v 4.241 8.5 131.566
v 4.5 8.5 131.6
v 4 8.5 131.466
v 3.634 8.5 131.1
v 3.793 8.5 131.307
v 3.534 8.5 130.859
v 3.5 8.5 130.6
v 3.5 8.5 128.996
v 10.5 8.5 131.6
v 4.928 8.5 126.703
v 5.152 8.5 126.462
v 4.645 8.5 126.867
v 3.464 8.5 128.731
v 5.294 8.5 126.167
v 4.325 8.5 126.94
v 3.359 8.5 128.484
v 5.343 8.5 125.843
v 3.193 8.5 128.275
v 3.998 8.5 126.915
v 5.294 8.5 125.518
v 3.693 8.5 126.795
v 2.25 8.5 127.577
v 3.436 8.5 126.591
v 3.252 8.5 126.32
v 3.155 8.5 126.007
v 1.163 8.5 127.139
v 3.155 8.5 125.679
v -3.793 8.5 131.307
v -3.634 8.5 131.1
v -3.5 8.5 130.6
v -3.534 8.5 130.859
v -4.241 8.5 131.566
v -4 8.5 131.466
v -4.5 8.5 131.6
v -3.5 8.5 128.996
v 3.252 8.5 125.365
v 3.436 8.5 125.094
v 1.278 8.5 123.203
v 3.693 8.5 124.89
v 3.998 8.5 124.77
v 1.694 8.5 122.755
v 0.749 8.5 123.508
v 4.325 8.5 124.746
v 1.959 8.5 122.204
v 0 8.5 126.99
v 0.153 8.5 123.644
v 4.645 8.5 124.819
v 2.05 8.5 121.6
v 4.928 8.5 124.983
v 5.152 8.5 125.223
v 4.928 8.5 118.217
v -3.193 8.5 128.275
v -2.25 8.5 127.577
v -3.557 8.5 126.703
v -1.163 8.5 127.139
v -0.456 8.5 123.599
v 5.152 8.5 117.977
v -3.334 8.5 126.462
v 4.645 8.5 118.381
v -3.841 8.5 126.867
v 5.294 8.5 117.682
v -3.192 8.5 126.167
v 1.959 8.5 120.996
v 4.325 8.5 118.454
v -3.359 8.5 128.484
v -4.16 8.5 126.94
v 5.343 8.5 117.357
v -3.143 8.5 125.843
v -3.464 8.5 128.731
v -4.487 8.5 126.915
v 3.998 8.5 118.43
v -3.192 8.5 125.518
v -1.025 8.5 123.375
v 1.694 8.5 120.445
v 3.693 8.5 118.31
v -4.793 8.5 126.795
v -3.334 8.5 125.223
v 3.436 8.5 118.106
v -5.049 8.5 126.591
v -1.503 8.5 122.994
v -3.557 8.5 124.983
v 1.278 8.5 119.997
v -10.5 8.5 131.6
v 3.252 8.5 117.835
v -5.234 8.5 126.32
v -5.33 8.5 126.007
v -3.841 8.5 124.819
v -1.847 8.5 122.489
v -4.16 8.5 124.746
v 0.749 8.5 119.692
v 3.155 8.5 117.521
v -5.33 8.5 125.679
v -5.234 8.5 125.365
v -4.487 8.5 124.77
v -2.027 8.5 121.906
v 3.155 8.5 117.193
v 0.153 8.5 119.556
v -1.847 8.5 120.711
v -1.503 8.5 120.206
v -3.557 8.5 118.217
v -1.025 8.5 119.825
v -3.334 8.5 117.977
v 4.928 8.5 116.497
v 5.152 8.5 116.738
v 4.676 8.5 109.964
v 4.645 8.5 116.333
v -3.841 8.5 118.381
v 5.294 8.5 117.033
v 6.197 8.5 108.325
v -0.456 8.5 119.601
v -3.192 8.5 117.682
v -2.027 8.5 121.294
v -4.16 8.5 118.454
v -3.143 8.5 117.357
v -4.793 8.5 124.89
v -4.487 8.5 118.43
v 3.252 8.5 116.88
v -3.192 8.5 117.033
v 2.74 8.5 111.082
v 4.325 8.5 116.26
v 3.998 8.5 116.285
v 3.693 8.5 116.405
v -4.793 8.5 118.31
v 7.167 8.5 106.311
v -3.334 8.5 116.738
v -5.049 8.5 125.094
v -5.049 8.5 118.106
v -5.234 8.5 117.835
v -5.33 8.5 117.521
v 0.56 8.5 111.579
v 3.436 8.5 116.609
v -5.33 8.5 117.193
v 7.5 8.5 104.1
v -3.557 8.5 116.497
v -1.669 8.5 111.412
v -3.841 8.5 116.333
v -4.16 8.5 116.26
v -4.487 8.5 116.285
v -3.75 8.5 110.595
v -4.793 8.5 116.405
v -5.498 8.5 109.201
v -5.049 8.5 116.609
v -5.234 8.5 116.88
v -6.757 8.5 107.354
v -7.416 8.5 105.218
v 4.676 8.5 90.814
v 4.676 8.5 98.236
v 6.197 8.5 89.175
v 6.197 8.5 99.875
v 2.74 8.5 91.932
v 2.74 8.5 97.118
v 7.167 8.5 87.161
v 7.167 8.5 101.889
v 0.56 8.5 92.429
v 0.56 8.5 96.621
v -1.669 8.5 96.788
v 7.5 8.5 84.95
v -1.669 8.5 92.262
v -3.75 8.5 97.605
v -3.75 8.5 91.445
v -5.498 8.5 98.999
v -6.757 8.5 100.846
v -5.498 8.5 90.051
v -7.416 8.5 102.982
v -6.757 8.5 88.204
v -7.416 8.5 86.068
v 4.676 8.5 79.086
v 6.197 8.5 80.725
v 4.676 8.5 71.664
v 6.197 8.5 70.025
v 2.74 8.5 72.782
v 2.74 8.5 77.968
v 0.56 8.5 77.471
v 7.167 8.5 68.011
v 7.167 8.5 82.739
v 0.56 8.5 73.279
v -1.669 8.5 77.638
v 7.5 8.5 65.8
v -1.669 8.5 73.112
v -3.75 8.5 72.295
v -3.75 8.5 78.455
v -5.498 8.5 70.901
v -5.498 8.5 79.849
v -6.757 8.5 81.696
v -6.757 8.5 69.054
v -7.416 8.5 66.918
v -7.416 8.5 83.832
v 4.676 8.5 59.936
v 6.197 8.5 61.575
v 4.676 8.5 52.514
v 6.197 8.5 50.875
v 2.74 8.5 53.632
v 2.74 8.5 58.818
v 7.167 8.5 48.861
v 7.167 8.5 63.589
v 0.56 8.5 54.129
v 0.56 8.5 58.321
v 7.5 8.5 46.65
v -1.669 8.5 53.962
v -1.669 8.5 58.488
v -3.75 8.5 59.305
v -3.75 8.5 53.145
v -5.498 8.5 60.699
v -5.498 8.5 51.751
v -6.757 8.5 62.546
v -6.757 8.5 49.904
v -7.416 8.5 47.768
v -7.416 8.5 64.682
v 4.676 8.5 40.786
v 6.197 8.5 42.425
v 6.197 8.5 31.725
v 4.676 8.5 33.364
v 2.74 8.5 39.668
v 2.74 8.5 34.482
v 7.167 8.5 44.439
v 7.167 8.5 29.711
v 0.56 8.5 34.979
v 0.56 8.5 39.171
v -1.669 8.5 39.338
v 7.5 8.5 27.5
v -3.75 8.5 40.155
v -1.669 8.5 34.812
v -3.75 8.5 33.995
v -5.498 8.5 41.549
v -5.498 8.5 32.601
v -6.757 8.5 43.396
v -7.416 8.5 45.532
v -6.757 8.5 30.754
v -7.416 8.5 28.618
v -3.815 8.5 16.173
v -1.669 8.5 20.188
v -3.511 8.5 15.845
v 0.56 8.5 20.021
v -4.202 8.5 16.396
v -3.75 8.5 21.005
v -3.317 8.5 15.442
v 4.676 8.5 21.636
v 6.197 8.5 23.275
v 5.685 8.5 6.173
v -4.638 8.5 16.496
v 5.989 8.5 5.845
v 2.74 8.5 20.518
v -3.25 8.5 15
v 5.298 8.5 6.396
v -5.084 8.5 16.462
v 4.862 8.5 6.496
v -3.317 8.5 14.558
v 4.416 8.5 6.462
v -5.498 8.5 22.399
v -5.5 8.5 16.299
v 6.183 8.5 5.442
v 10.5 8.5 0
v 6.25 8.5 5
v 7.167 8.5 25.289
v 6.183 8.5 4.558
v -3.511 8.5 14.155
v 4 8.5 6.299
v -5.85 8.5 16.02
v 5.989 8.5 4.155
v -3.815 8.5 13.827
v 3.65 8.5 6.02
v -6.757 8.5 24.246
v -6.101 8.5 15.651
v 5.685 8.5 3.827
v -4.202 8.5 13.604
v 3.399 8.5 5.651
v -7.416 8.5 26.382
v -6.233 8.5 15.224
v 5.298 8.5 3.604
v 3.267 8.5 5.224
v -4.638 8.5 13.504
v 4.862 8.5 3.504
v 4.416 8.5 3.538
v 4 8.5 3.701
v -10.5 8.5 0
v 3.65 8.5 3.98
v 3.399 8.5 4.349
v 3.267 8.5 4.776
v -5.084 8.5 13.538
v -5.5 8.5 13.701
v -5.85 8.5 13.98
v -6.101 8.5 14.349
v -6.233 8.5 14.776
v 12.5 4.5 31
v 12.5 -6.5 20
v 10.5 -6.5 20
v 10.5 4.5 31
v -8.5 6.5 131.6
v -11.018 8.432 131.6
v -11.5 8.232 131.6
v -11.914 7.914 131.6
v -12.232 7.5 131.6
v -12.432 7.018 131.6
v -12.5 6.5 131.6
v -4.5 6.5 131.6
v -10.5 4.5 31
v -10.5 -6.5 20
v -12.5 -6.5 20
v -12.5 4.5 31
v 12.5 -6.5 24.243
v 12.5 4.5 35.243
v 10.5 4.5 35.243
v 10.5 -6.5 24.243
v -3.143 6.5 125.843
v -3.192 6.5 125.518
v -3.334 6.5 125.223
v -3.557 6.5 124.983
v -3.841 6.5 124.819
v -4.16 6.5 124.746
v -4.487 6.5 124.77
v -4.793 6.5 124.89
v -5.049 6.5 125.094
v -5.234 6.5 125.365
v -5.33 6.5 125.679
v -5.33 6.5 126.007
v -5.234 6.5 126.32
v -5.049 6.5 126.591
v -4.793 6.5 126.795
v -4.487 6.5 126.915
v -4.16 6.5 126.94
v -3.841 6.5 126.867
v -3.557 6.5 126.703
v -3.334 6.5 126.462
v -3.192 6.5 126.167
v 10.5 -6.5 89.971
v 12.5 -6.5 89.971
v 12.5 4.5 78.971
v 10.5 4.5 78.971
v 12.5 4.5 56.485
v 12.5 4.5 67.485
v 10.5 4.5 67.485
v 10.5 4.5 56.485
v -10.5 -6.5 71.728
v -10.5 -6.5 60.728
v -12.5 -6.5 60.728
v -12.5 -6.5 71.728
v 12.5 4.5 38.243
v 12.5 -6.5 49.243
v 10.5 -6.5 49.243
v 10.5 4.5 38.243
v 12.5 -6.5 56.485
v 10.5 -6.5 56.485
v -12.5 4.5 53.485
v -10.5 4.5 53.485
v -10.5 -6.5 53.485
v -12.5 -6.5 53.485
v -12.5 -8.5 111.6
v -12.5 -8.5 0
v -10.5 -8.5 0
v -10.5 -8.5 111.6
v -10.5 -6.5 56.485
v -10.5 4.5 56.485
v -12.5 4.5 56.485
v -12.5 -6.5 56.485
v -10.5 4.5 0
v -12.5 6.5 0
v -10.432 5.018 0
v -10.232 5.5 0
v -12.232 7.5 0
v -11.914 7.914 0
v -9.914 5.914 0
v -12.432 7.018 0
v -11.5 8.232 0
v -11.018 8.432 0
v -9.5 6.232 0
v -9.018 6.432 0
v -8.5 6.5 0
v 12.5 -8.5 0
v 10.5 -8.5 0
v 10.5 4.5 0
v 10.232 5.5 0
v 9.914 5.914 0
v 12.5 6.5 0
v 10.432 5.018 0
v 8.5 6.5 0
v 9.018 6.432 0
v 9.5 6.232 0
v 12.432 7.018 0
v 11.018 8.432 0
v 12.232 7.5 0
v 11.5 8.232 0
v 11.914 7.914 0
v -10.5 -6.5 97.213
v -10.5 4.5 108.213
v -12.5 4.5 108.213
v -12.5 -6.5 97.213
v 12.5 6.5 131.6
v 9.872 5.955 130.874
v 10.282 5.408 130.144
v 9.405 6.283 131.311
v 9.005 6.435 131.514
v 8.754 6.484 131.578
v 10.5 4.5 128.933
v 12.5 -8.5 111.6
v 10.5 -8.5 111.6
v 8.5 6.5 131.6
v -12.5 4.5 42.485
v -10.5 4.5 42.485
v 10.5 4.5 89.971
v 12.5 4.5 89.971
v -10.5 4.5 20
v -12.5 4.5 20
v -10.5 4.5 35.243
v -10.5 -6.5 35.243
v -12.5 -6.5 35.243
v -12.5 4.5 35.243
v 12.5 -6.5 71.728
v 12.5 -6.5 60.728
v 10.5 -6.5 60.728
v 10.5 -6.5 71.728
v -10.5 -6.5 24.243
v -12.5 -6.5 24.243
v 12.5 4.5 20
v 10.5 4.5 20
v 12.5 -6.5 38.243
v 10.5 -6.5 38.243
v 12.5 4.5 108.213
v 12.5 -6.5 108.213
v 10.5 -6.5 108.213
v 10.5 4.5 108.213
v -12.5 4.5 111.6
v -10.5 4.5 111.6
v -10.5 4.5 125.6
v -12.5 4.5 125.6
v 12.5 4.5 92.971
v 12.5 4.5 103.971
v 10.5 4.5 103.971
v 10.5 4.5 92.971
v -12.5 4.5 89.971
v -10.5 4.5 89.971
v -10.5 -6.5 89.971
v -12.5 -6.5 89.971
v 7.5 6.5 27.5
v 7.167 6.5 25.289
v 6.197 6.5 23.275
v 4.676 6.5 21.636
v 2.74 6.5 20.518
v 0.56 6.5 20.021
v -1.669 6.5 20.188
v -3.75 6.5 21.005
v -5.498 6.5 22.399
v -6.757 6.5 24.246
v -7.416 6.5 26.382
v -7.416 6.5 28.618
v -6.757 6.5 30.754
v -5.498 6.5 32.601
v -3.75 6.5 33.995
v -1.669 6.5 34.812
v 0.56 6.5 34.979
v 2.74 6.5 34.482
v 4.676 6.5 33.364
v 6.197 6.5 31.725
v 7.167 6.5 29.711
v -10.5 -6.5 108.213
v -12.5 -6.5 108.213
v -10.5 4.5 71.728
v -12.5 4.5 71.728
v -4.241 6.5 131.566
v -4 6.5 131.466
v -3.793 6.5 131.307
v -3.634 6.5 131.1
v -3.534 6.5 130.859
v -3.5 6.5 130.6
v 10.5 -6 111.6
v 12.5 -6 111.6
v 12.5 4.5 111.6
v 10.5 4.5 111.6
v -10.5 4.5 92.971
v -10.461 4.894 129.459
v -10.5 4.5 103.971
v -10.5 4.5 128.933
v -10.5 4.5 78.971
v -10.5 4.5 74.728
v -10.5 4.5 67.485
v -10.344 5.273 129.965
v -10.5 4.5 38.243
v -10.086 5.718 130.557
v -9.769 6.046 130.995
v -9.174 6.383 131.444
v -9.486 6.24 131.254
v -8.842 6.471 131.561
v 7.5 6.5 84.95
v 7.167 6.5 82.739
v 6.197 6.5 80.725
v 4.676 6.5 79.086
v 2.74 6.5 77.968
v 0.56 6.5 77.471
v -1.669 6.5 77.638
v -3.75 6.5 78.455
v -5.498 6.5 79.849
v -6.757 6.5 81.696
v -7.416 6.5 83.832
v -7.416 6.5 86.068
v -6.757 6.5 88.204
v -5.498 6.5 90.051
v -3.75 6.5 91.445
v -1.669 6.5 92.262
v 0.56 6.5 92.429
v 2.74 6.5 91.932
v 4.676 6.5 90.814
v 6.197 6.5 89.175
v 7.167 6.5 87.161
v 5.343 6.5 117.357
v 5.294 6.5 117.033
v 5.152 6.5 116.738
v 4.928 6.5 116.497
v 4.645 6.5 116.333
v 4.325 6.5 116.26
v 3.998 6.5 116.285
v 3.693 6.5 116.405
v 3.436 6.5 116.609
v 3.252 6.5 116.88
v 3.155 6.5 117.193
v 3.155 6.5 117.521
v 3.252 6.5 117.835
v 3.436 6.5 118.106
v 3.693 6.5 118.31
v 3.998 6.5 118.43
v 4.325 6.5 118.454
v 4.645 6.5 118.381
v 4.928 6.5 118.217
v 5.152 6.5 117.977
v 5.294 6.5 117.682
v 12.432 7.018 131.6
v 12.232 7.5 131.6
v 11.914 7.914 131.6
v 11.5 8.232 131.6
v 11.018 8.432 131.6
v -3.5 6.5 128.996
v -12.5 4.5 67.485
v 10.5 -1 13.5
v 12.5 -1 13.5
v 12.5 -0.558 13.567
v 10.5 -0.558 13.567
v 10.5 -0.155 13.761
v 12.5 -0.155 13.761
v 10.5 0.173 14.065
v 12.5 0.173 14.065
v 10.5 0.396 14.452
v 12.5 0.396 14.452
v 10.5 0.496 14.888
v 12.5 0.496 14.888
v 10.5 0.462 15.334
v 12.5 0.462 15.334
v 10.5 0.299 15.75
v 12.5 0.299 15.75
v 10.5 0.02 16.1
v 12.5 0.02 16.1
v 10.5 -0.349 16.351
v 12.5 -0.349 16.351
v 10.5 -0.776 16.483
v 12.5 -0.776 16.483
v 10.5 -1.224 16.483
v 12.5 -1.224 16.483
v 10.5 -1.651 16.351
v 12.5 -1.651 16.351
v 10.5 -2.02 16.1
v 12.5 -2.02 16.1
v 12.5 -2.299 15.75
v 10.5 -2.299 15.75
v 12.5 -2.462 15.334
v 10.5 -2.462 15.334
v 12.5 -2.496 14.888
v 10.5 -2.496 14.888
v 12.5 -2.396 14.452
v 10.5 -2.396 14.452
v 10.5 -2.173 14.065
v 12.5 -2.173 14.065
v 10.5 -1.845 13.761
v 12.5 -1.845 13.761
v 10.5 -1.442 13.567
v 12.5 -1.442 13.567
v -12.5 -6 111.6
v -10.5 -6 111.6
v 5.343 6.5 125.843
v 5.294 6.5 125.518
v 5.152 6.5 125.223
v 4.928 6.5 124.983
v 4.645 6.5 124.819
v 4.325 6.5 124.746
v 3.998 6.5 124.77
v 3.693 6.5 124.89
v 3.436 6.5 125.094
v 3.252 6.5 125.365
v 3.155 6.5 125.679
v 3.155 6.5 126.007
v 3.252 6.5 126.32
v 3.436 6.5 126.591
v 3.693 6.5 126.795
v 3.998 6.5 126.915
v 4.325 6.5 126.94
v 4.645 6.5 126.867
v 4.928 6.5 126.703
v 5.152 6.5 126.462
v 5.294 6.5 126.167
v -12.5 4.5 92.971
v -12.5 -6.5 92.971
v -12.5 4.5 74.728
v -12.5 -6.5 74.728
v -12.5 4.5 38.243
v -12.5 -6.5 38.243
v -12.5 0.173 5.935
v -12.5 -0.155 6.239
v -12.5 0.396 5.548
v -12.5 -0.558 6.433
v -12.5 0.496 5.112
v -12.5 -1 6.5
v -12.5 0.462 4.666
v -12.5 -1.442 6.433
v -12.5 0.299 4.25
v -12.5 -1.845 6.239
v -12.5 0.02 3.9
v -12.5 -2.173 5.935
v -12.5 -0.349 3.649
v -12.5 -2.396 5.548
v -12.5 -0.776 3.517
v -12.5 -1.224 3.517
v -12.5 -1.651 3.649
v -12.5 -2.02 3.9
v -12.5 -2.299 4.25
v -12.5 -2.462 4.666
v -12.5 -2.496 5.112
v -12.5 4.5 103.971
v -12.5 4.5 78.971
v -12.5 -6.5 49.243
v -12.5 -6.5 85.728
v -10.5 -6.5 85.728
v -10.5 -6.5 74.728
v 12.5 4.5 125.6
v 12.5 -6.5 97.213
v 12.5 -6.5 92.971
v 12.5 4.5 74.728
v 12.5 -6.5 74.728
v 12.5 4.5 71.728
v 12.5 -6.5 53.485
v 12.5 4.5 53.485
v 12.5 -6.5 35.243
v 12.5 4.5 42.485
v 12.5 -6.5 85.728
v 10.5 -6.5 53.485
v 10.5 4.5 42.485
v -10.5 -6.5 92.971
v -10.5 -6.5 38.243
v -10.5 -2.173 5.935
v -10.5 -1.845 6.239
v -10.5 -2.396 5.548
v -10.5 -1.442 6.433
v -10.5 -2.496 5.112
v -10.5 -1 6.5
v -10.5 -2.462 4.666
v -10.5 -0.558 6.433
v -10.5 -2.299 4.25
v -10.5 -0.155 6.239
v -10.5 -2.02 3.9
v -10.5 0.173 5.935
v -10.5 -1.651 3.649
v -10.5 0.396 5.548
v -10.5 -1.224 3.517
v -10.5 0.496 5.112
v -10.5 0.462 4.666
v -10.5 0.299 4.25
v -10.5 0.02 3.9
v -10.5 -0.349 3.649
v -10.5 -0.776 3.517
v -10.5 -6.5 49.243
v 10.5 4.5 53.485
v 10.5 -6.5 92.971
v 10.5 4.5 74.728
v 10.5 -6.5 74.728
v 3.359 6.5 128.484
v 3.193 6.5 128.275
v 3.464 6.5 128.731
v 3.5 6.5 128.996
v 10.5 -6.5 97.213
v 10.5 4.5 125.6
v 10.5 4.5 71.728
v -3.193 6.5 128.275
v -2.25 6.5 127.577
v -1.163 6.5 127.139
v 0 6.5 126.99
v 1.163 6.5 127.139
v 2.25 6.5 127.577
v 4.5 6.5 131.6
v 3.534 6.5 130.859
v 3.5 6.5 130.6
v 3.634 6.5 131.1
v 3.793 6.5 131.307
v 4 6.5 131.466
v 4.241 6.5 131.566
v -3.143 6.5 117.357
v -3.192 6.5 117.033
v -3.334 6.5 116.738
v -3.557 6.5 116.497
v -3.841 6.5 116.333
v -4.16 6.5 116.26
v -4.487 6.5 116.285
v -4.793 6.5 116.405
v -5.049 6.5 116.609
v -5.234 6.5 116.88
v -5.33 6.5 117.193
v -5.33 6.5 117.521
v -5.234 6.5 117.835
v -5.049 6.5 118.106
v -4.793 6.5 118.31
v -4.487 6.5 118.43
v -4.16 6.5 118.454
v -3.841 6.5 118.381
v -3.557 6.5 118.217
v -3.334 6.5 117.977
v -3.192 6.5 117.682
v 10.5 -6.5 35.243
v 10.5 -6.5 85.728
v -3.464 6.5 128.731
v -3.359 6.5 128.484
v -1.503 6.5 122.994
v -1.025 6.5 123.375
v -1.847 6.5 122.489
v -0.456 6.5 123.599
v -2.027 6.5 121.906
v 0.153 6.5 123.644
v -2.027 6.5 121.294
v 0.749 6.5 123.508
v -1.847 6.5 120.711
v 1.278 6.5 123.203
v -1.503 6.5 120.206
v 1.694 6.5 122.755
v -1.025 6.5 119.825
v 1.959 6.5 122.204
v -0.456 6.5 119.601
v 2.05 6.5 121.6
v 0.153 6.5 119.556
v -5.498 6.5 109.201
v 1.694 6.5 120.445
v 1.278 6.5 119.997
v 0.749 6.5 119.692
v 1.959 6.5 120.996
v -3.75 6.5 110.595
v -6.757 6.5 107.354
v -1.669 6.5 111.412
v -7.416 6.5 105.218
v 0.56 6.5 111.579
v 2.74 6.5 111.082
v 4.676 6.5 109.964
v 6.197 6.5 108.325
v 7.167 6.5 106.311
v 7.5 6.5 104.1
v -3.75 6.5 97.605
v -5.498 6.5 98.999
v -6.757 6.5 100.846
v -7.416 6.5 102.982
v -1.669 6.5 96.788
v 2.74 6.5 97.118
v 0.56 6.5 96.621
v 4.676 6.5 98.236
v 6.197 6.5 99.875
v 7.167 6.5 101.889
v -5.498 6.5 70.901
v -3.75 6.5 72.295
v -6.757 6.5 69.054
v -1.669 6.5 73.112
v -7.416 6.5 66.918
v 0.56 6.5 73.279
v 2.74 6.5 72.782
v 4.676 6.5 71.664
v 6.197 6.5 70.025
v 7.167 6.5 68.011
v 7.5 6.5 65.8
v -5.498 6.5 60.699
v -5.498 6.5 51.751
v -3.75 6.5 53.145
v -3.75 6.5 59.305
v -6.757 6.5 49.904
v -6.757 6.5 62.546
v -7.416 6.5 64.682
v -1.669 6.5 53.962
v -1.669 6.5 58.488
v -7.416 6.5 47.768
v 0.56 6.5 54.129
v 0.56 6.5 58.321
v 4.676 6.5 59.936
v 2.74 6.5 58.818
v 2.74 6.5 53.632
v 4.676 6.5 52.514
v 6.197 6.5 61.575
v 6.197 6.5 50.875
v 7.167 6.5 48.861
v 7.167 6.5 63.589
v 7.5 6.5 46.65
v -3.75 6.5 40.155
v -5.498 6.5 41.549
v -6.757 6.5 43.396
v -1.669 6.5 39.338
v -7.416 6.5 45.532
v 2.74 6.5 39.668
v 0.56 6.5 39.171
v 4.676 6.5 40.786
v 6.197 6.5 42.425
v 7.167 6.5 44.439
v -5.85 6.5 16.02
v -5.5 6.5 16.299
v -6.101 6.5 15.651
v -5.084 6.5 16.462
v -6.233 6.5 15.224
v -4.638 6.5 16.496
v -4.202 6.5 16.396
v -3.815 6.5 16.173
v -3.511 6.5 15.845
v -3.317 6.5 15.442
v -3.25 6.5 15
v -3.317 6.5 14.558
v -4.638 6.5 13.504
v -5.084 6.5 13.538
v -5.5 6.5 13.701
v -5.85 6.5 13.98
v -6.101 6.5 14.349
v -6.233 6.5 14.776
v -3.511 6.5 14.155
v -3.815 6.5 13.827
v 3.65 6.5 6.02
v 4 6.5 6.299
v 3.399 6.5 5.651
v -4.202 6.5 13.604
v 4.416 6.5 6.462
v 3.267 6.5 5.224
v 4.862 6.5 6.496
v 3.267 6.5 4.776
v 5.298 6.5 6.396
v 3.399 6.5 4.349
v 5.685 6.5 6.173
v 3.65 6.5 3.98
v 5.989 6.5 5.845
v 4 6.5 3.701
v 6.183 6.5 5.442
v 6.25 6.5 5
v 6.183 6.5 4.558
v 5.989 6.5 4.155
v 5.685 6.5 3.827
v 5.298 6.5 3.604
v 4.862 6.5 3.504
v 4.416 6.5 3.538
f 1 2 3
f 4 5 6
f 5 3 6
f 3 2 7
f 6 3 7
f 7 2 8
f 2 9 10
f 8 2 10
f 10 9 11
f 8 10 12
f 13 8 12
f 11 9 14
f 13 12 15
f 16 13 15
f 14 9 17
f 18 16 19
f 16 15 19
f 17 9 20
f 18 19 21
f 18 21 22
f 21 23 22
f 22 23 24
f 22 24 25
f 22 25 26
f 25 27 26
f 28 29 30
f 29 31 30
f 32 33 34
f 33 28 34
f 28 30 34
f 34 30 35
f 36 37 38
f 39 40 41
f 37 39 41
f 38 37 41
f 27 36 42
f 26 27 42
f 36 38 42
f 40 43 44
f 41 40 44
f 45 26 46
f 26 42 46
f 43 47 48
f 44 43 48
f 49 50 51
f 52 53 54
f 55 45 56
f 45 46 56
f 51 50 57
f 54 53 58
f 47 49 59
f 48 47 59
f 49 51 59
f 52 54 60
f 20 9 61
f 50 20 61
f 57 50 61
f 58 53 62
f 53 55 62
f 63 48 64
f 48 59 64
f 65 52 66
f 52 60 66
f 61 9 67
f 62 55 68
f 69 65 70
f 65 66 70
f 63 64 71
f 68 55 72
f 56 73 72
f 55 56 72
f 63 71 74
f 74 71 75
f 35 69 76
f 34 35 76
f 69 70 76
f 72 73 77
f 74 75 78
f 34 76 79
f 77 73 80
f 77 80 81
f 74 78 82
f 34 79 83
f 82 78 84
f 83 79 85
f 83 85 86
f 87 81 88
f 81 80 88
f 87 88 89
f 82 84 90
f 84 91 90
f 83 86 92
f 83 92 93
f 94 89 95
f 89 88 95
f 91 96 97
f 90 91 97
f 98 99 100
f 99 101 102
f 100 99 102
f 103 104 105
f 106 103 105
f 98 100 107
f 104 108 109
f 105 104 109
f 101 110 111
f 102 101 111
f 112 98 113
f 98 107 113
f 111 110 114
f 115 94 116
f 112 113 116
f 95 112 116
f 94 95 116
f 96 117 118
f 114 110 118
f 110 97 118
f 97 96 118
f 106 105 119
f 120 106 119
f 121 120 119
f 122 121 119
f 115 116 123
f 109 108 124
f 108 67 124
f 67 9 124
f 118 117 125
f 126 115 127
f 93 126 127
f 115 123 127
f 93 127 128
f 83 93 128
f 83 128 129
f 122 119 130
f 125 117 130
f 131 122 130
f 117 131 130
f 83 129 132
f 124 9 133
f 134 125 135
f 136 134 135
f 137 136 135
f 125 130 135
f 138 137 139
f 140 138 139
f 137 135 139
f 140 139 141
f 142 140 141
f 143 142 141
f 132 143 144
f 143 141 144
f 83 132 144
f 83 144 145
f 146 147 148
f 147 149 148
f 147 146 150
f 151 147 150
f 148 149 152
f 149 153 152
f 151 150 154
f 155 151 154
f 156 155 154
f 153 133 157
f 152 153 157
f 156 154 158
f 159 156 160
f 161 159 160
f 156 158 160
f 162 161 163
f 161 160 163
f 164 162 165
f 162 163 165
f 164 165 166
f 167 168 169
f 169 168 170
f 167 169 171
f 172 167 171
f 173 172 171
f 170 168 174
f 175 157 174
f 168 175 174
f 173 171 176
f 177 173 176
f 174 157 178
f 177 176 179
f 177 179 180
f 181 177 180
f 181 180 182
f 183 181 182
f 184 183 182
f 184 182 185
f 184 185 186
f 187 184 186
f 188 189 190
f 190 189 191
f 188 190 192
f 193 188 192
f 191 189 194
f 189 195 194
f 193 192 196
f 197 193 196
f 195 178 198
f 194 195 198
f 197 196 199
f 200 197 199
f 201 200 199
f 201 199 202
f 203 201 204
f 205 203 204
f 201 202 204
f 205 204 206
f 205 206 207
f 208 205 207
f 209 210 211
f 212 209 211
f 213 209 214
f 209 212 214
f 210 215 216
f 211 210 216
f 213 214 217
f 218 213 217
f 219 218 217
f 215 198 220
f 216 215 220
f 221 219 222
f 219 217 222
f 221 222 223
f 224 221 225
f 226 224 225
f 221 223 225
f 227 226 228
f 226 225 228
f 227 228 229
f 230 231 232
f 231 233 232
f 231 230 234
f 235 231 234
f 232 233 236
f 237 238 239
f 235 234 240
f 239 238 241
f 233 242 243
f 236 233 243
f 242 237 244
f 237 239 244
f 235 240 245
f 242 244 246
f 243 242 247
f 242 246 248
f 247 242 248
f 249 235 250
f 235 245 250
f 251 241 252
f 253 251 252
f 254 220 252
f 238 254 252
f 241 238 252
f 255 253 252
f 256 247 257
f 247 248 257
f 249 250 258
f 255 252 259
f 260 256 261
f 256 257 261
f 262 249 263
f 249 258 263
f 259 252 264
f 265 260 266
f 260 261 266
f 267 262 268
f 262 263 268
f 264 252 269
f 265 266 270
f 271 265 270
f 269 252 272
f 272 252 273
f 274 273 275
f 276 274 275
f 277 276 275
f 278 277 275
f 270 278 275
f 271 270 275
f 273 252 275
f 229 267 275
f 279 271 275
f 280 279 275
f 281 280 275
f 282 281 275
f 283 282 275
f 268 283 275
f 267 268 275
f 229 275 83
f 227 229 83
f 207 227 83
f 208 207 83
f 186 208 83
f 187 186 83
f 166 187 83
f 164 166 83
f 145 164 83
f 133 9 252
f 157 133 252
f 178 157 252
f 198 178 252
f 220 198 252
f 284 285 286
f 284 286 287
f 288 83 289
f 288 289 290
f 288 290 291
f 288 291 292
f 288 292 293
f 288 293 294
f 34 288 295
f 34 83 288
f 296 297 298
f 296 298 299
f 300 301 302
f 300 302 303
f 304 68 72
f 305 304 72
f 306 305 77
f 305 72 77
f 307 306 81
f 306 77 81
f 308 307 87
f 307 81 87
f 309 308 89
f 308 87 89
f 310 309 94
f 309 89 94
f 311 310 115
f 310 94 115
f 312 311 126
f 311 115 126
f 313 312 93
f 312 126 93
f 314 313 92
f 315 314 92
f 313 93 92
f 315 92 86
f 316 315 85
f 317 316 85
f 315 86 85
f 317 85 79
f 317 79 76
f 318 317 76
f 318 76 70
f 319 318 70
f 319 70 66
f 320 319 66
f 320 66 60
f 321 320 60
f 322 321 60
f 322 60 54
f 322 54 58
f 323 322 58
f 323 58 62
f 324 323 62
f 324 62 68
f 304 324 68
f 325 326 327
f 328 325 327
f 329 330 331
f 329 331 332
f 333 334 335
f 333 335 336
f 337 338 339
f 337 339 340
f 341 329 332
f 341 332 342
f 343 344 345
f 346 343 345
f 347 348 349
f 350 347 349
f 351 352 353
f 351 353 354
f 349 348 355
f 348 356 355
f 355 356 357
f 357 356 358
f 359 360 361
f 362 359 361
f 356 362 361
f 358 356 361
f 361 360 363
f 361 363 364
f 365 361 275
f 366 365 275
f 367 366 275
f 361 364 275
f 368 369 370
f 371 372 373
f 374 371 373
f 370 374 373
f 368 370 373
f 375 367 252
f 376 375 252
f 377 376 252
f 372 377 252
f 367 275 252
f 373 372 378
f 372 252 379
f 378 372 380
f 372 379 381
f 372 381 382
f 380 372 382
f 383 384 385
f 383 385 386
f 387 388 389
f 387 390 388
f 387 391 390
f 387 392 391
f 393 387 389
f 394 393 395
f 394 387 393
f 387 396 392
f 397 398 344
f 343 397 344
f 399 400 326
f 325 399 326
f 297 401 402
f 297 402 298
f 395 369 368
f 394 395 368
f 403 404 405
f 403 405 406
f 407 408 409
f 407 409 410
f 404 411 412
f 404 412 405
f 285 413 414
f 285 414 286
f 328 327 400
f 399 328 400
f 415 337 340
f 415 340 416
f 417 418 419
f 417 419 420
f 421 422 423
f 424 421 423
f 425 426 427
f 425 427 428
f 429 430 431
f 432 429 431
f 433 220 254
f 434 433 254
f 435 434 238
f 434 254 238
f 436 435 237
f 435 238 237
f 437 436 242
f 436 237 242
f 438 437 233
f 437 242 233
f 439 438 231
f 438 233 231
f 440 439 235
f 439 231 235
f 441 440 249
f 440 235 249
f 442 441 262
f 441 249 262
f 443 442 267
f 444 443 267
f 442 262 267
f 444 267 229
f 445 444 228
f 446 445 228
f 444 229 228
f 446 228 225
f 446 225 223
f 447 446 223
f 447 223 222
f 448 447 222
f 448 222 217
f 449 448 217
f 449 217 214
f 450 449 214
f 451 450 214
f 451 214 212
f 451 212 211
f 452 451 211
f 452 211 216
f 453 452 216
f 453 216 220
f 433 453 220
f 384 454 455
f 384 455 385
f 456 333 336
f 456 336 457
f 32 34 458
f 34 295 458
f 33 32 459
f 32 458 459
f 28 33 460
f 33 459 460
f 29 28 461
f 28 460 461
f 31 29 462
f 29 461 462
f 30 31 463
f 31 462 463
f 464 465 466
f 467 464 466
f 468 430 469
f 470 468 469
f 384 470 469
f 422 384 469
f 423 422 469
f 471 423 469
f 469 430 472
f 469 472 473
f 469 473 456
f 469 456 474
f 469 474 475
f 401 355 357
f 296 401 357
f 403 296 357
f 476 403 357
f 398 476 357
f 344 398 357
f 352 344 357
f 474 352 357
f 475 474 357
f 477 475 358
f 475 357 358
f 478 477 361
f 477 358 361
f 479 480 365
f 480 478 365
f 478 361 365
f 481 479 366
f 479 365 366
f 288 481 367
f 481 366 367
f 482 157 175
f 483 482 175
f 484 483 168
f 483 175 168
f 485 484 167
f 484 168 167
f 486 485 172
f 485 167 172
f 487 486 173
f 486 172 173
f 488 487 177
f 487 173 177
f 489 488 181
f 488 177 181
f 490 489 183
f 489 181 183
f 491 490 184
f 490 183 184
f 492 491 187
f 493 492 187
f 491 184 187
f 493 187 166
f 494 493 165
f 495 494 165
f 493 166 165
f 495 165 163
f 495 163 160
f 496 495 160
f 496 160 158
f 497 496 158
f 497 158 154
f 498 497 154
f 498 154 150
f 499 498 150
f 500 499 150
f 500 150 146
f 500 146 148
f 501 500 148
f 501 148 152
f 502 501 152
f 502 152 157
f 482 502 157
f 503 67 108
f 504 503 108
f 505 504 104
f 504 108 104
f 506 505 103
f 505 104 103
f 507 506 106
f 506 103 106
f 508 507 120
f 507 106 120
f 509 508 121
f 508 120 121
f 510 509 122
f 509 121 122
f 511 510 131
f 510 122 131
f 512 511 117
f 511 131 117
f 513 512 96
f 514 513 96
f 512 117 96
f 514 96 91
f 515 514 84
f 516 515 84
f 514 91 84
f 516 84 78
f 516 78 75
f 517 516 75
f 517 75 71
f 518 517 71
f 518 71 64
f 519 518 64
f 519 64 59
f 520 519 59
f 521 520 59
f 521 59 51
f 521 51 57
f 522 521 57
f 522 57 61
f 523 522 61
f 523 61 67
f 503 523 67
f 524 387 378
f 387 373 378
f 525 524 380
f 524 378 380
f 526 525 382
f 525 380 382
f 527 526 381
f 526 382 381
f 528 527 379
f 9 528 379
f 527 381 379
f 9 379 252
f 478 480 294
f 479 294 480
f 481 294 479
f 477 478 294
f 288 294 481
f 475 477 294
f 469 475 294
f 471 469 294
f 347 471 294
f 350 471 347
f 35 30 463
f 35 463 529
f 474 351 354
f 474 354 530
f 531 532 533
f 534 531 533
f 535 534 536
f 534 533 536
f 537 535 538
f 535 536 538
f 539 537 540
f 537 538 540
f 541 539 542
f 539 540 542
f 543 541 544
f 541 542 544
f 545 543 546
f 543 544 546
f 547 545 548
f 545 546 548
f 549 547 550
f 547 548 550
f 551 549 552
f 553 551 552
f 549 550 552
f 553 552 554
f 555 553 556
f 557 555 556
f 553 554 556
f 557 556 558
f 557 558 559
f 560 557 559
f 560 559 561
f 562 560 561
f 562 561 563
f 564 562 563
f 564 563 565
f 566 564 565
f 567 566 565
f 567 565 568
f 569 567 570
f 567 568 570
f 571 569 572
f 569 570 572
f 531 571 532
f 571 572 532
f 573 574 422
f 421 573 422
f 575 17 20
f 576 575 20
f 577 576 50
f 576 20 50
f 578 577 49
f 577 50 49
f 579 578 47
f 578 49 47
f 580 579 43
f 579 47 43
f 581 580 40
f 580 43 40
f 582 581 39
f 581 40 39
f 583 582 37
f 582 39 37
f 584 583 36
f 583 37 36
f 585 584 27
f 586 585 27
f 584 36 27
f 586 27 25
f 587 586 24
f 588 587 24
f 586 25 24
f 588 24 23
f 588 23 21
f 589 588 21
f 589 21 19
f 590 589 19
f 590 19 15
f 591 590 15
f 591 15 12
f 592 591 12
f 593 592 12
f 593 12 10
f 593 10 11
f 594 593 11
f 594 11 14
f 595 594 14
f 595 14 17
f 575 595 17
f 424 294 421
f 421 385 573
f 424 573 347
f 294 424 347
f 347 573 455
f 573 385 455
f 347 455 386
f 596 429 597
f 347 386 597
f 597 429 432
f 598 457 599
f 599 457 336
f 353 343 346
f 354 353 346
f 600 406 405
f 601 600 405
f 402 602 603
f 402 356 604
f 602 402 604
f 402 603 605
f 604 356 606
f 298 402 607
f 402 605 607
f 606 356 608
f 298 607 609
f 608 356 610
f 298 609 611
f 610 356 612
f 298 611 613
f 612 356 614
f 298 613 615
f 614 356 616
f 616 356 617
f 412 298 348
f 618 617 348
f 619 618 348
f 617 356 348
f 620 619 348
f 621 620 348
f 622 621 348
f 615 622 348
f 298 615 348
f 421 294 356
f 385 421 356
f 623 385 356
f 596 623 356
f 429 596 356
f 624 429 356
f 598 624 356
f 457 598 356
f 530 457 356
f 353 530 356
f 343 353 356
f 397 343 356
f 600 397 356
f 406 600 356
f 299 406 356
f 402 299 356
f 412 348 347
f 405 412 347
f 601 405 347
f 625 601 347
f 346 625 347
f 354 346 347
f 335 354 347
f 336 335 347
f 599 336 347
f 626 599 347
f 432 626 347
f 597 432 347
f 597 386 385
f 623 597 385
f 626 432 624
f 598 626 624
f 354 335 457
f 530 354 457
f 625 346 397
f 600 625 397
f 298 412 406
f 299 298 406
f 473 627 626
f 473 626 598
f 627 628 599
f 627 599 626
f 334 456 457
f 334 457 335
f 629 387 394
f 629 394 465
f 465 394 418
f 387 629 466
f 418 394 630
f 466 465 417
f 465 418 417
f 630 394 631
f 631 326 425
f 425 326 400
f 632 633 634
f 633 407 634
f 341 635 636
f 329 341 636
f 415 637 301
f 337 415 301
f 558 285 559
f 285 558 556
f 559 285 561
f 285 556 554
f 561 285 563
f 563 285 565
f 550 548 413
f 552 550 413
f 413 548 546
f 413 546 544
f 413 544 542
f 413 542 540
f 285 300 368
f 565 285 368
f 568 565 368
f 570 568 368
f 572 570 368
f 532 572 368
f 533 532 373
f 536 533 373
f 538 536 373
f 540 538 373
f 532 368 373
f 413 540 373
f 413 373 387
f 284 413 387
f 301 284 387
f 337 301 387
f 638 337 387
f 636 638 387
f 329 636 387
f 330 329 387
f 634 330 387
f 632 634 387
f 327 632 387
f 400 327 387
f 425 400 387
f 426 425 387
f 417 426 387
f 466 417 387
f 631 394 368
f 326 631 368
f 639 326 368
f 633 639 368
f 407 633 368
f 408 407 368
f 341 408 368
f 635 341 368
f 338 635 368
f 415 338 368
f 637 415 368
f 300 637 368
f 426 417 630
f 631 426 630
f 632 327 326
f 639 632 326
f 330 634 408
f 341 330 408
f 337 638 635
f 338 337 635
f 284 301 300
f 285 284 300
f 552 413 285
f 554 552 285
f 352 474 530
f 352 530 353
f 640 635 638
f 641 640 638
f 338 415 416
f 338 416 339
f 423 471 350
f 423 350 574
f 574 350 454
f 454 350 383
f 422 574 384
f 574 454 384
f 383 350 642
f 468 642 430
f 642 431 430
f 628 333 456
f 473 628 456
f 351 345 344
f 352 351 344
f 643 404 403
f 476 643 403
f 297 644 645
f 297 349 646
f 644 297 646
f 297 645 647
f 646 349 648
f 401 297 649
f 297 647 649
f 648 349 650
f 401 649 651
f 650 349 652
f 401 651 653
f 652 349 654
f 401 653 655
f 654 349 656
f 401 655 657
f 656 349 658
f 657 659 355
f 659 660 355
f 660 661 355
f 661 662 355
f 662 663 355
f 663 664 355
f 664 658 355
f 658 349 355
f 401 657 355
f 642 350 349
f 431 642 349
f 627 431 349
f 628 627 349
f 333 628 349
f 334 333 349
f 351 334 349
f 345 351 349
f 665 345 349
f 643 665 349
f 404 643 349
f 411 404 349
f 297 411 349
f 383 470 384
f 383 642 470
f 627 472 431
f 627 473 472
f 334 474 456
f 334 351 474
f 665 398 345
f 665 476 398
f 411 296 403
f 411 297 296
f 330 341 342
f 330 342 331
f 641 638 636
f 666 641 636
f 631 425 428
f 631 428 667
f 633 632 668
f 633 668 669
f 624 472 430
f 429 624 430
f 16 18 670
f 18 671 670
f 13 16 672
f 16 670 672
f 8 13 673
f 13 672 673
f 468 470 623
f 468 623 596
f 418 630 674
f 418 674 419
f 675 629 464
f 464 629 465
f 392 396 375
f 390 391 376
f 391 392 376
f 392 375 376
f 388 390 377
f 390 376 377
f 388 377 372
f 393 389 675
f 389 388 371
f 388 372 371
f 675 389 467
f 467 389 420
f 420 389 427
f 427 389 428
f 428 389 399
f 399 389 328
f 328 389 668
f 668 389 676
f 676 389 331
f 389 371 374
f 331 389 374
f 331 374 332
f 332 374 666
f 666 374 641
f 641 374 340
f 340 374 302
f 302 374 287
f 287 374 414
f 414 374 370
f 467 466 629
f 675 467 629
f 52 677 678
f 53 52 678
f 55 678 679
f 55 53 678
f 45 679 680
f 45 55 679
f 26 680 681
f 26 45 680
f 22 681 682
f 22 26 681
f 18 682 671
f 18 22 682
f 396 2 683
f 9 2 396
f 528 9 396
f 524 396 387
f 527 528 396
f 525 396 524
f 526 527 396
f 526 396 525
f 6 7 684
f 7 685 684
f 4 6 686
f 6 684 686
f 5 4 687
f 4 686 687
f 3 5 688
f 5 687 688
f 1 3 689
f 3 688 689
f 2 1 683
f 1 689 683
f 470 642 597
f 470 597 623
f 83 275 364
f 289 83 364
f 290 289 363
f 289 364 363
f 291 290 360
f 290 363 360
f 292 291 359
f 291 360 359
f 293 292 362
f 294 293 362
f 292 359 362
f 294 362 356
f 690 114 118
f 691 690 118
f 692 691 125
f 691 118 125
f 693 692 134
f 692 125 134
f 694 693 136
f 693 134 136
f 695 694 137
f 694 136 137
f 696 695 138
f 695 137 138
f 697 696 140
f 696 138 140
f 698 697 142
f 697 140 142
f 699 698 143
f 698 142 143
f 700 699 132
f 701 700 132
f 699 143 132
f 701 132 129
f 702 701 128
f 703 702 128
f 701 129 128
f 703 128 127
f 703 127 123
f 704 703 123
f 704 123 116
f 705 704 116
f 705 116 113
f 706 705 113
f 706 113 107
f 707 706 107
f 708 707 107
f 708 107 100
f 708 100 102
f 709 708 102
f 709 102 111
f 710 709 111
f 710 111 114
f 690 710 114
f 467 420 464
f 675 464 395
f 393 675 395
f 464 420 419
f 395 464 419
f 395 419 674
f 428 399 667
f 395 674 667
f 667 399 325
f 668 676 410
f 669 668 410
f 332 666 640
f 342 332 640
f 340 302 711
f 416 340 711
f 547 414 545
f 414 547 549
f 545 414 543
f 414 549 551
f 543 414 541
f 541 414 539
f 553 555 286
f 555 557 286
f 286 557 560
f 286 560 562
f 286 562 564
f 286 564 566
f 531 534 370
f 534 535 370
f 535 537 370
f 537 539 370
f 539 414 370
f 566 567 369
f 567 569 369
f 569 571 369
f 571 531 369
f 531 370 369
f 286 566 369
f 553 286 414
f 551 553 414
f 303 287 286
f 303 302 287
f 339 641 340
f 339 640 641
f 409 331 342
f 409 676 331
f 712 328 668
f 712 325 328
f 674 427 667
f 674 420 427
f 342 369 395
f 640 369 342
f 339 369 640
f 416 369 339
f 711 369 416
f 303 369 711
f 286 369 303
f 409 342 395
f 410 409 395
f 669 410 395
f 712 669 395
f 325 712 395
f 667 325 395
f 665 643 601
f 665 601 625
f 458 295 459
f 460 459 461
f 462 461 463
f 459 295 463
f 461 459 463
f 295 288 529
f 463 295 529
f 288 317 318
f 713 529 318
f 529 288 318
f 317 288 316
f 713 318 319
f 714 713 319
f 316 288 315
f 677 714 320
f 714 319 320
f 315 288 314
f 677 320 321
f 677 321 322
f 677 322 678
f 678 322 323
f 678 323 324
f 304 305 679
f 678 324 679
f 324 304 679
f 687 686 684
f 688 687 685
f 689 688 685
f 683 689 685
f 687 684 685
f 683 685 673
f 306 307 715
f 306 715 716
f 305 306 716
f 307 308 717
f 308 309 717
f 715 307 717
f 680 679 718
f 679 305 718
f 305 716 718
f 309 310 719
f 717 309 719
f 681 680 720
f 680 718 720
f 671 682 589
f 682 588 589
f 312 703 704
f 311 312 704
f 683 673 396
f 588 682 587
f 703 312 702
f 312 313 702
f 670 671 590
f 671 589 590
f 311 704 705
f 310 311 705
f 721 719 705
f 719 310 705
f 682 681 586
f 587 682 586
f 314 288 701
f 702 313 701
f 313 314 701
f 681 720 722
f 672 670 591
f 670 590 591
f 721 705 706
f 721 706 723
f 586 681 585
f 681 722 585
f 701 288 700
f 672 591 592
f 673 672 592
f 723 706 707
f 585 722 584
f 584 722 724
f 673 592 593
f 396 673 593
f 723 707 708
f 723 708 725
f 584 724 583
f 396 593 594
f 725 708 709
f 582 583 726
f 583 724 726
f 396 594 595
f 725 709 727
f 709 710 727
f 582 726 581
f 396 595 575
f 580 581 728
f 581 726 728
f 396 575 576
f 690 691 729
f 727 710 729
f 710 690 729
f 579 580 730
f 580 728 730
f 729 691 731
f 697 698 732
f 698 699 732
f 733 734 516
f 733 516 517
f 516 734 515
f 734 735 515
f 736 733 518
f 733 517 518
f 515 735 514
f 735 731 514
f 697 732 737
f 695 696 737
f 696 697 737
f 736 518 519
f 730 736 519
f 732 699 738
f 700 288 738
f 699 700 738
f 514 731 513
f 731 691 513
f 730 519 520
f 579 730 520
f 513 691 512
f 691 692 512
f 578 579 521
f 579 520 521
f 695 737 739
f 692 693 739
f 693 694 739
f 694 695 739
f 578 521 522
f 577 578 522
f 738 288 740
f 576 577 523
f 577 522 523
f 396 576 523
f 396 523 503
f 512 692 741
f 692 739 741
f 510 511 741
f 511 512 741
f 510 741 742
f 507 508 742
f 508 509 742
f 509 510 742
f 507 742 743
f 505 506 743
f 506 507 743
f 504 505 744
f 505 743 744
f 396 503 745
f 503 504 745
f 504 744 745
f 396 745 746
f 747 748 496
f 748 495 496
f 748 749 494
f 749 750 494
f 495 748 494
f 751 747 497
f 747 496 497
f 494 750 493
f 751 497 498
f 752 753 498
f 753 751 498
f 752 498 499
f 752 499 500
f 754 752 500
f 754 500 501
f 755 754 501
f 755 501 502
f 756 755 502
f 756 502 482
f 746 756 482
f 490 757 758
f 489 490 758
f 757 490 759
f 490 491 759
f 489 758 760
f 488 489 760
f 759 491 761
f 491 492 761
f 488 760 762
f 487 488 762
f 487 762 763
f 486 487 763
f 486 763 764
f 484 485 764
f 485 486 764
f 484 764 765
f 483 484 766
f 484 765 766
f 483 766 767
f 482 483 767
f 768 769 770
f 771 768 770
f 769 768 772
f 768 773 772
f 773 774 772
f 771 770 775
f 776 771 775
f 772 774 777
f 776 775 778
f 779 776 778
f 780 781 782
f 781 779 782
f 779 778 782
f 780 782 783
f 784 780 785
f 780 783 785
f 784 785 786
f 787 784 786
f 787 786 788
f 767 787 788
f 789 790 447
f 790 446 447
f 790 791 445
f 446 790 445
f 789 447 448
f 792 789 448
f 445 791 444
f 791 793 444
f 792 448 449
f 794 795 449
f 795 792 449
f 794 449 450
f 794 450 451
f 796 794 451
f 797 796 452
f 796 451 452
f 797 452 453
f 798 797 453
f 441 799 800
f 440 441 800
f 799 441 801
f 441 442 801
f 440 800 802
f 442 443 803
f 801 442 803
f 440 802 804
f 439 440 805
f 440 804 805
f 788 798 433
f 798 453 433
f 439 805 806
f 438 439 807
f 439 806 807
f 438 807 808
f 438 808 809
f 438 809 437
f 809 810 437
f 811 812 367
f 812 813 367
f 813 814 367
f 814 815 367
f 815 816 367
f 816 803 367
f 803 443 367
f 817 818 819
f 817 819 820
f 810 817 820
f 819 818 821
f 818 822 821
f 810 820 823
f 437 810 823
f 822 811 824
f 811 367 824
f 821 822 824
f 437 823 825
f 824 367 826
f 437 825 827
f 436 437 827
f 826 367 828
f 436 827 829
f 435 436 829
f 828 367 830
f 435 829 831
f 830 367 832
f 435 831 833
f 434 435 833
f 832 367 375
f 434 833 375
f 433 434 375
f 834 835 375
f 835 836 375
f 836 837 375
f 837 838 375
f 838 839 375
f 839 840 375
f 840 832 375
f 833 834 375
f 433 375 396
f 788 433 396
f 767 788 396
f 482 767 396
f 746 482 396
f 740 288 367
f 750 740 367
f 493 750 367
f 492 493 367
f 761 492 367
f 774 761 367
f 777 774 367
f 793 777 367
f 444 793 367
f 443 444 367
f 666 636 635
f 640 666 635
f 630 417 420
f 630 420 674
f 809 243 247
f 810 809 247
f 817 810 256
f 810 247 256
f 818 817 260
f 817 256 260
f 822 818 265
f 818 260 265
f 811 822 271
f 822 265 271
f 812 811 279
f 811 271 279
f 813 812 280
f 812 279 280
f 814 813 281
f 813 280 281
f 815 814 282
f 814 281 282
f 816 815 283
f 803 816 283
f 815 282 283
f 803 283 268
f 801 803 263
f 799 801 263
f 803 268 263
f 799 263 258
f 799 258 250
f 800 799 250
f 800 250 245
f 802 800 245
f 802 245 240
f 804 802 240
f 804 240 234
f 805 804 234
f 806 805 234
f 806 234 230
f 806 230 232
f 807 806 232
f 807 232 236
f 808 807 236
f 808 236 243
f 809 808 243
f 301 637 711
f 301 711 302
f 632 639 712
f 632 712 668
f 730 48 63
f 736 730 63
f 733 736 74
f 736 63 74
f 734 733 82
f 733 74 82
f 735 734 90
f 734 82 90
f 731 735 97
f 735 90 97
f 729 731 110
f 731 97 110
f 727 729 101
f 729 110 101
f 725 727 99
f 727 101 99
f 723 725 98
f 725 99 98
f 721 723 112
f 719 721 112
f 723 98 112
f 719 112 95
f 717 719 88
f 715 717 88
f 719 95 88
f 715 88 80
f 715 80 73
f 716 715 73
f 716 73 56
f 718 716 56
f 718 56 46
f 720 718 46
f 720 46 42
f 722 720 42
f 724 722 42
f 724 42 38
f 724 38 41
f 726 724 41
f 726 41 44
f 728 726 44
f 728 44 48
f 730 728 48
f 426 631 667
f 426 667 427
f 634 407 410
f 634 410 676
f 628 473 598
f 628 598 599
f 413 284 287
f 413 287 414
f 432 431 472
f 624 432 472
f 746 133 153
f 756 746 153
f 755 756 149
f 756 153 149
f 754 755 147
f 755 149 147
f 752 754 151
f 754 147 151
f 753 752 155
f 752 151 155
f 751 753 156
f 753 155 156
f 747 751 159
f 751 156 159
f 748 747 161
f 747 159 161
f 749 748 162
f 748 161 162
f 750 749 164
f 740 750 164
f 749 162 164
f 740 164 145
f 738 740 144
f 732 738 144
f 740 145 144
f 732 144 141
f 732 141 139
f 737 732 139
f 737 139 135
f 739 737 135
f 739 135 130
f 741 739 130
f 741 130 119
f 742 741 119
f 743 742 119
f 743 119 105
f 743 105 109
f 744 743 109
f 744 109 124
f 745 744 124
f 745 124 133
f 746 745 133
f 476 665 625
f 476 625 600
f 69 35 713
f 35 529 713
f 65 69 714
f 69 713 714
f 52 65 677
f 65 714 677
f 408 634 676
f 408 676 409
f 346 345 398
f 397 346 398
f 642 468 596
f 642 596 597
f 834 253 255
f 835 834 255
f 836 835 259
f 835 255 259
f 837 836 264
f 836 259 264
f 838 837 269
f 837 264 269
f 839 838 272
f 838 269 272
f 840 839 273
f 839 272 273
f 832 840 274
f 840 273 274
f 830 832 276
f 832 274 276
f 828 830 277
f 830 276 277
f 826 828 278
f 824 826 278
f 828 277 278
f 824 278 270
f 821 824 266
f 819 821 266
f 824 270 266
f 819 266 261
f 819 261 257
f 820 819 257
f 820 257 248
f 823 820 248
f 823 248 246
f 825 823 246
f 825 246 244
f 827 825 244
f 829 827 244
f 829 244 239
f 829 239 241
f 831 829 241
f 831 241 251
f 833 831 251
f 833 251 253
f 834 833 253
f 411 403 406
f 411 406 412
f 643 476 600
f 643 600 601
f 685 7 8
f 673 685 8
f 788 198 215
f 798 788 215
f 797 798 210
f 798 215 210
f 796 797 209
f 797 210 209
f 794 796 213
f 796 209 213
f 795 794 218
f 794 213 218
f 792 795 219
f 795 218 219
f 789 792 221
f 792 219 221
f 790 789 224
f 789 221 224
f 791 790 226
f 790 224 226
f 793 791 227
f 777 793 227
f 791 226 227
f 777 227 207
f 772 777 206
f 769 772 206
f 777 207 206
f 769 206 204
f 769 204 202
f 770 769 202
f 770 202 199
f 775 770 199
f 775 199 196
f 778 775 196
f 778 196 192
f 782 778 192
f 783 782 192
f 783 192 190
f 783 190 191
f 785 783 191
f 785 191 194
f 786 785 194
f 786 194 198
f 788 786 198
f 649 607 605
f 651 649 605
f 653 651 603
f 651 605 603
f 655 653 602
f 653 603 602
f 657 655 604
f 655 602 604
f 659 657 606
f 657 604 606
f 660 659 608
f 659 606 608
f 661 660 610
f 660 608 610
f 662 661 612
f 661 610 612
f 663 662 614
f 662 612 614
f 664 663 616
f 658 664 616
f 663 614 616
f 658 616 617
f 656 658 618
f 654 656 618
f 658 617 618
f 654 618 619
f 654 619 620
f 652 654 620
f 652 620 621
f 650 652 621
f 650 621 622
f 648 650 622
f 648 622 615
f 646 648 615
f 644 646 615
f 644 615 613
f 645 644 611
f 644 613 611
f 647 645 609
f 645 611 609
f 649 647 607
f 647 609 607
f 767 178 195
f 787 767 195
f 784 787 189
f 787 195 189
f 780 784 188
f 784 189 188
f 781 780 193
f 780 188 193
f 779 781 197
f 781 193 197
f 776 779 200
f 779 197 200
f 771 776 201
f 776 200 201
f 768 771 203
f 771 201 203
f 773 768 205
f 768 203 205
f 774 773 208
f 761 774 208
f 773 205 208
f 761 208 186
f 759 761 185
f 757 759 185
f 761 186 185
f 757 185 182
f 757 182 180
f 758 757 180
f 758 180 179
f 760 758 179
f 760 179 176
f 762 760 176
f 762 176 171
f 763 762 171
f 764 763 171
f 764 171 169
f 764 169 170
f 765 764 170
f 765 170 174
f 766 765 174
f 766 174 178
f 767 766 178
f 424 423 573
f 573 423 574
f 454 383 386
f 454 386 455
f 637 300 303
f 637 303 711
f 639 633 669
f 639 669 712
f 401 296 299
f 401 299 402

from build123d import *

# Parameters (mm, degrees)
BOSS_EXTRUDE1_DEPTH     = 20
SKETCH3_R               = 1.5
CUT_EXTRUDE1_DEPTH      = 1
CUT_EXTRUDE1_DEPTH_BACK = 2
SKETCH17_R              = 1.5
CUT_EXTRUDE13_DEPTH     = 2
SKETCH4_R               = 1.5
CUT_EXTRUDE2_DEPTH      = 1
CUT_EXTRUDE2_DEPTH_BACK = 18
BOSS_EXTRUDE2_DEPTH     = 111.6
SKETCH7_R               = 7.5
CUT_EXTRUDE3_DEPTH      = 18
LPATTERN1_COUNT         = 5
LPATTERN1_PITCH         = 19.15
SKETCH8_R               = 1.1
CUT_EXTRUDE4_DEPTH      = 18
CUT_EXTRUDE6_DEPTH      = 26
CUT_EXTRUDE7_DEPTH      = 26
CUT_EXTRUDE8_DEPTH      = 26
CUT_EXTRUDE9_DEPTH      = 26
CUT_EXTRUDE10_DEPTH     = 26
LPATTERN2_COUNT         = 3
LPATTERN2_PITCH         = 36.4853
LPATTERN3_COUNT         = 3
LPATTERN3_PITCH         = 36.4853
LPATTERN4_COUNT         = 2
LPATTERN4_PITCH         = 36.4853
LPATTERN5_COUNT         = 2
LPATTERN5_PITCH         = 36.4853
CUT_EXTRUDE11_DEPTH     = 26
SKETCH16_R              = 2.05
CUT_EXTRUDE12_DEPTH     = 18
SKETCH18_W              = 7
SKETCH18_H              = 3
CUT_EXTRUDE14_DEPTH     = 2
FILLET1_R               = 1


with BuildPart() as part:
    # Sketch1 → Boss-Extrude1 (new body)
    with BuildSketch(Plane.XY):
        with BuildLine():
            Line((-12.5, -8.5), (-10.5, -8.5))
            Line((-10.5, -8.5), (-10.5, 4.5))
            ThreePointArc((-10.5, 4.5), (-9.914213562, 5.914213562), (-8.5, 6.5))
            Line((-8.5, 6.5), (8.5, 6.5))
            ThreePointArc((8.5, 6.5), (9.914213562, 5.914213562), (10.5, 4.5))
            Line((10.5, 4.5), (10.5, -8.5))
            Line((10.5, -8.5), (12.5, -8.5))
            Line((12.5, -8.5), (12.5, 6.5))
            ThreePointArc((12.5, 6.5), (11.914213562, 7.914213562), (10.5, 8.5))
            Line((10.5, 8.5), (-10.5, 8.5))
            ThreePointArc((-10.5, 8.5), (-11.914213562, 7.914213562), (-12.5, 6.5))
            Line((-12.5, 6.5), (-12.5, -8.5))
        make_face()
    extrude(amount=BOSS_EXTRUDE1_DEPTH)

    # Sketch3 → Cut-Extrude1 (cut, two sides)
    with BuildSketch(Plane(origin=(12.5, 0, 0), x_dir=(0, 0, -1), z_dir=(1, 0, 0))) as cut_extrude1_sk:
        with Locations((-15, -1)):
            Circle(SKETCH3_R)
    extrude(amount=CUT_EXTRUDE1_DEPTH, mode=Mode.SUBTRACT)
    extrude(cut_extrude1_sk.sketch, amount=-CUT_EXTRUDE1_DEPTH_BACK, mode=Mode.SUBTRACT)

    # Sketch17 → Cut-Extrude13 (cut)
    with BuildSketch(Plane.ZY.offset(12.5)):
        with Locations((5, -1)):
            Circle(SKETCH17_R)
    extrude(amount=-CUT_EXTRUDE13_DEPTH, mode=Mode.SUBTRACT)

    # Sketch4 → Cut-Extrude2 (cut, two sides)
    with BuildSketch(Plane(origin=(0, 8.5, 0), x_dir=(1, 0, 0), z_dir=(0, 1, 0))) as cut_extrude2_sk:
        with Locations((-4.75, -15)):
            Circle(SKETCH4_R)
        with Locations((4.75, -5)):
            Circle(SKETCH4_R)
    extrude(amount=CUT_EXTRUDE2_DEPTH, mode=Mode.SUBTRACT)
    extrude(cut_extrude2_sk.sketch, amount=-CUT_EXTRUDE2_DEPTH_BACK, mode=Mode.SUBTRACT)

    # Sketch6 → Boss-Extrude2 (add)
    with BuildSketch(Plane.XY.offset(20)):
        with BuildLine():
            Line((-12.5, 6.5), (-12.5, -8.5))
            Line((-12.5, -8.5), (-10.5, -8.5))
            Line((-10.5, -8.5), (-10.5, 4.5))
            ThreePointArc((-10.5, 4.5), (-9.914213562, 5.914213562), (-8.5, 6.5))
            Line((-8.5, 6.5), (8.5, 6.5))
            ThreePointArc((8.5, 6.5), (9.914213562, 5.914213562), (10.5, 4.5))
            Line((10.5, 4.5), (10.5, -8.5))
            Line((10.5, -8.5), (12.5, -8.5))
            Line((12.5, -8.5), (12.5, 6.5))
            ThreePointArc((12.5, 6.5), (11.914213562, 7.914213562), (10.5, 8.5))
            Line((10.5, 8.5), (-10.5, 8.5))
            ThreePointArc((-10.5, 8.5), (-11.914213562, 7.914213562), (-12.5, 6.5))
        make_face()
    extrude(amount=BOSS_EXTRUDE2_DEPTH)

    # Sketch7 → Cut-Extrude3 (cut, through all)
    with BuildSketch(Plane(origin=(0, 8.5, 0), x_dir=(1, 0, 0), z_dir=(0, 1, 0))):
        with Locations((0, -104.1)):
            Circle(SKETCH7_R)
    cut_extrude3 = extrude(amount=-CUT_EXTRUDE3_DEPTH, mode=Mode.SUBTRACT)

    # LPattern1: Cut-Extrude3 ×5
    with Locations(*[(0, 0, -i * LPATTERN1_PITCH) for i in range(1, LPATTERN1_COUNT)]):
        add(cut_extrude3, mode=Mode.SUBTRACT)

    # Sketch8 → Cut-Extrude4 (cut, through all)
    with BuildSketch(Plane(origin=(0, 8.5, 0), x_dir=(1, 0, 0), z_dir=(0, 1, 0))):
        with Locations((4.242640687, -117.357359313)):
            Circle(SKETCH8_R)
        with Locations((4.242640687, -125.842640687)):
            Circle(SKETCH8_R)
        with Locations((-4.242640687, -125.842640687)):
            Circle(SKETCH8_R)
        with Locations((-4.242640687, -117.357359313)):
            Circle(SKETCH8_R)
    extrude(amount=-CUT_EXTRUDE4_DEPTH, mode=Mode.SUBTRACT)

    # Sketch9 → Cut-Extrude6 (cut, through all)
    with BuildSketch(Plane(origin=(12.5, 0, 0), x_dir=(0, 0, -1), z_dir=(1, 0, 0))):
        Polygon((-131.6, 6.5), (-111.6, -8.5), (-131.6, -8.5), align=None)
    extrude(amount=-CUT_EXTRUDE6_DEPTH, mode=Mode.SUBTRACT)

    # Sketch10 → Cut-Extrude7 (cut, through all)
    with BuildSketch(Plane(origin=(12.5, 0, 0), x_dir=(0, 0, -1), z_dir=(1, 0, 0))):
        Polygon((-31, 4.5), (-20, 4.5), (-20, -6.5), align=None)
    cut_extrude7 = extrude(amount=-CUT_EXTRUDE7_DEPTH, mode=Mode.SUBTRACT)

    # Sketch11 → Cut-Extrude8 (cut, through all)
    with BuildSketch(Plane(origin=(12.5, 0, 0), x_dir=(0, 0, -1), z_dir=(1, 0, 0))):
        Polygon((-35.242640687, 4.5), (-24.242640687, -6.5), (-35.242640687, -6.5), align=None)
    cut_extrude8 = extrude(amount=-CUT_EXTRUDE8_DEPTH, mode=Mode.SUBTRACT)

    # Sketch12 → Cut-Extrude9 (cut, through all)
    with BuildSketch(Plane(origin=(12.5, 0, 0), x_dir=(0, 0, -1), z_dir=(1, 0, 0))):
        Polygon((-38.242640687, 4.5), (-38.242640687, -6.5), (-49.242640687, -6.5), align=None)
    cut_extrude9 = extrude(amount=-CUT_EXTRUDE9_DEPTH, mode=Mode.SUBTRACT)

    # Sketch13 → Cut-Extrude10 (cut, through all)
    with BuildSketch(Plane(origin=(12.5, 0, 0), x_dir=(0, 0, -1), z_dir=(1, 0, 0))):
        Polygon((-53.485281374, -6.5), (-42.485281374, 4.5), (-53.485281374, 4.5), align=None)
    cut_extrude10 = extrude(amount=-CUT_EXTRUDE10_DEPTH, mode=Mode.SUBTRACT)

    # LPattern2: Cut-Extrude7 ×3
    with Locations(*[(0, 0, i * LPATTERN2_PITCH) for i in range(1, LPATTERN2_COUNT)]):
        add(cut_extrude7, mode=Mode.SUBTRACT)

    # LPattern3: Cut-Extrude8 ×3
    with Locations(*[(0, 0, i * LPATTERN3_PITCH) for i in range(1, LPATTERN3_COUNT)]):
        add(cut_extrude8, mode=Mode.SUBTRACT)

    # LPattern4: Cut-Extrude9 ×2
    with Locations(*[(0, 0, i * LPATTERN4_PITCH) for i in range(1, LPATTERN4_COUNT)]):
        add(cut_extrude9, mode=Mode.SUBTRACT)

    # LPattern5: Cut-Extrude10 ×2
    with Locations(*[(0, 0, i * LPATTERN5_PITCH) for i in range(1, LPATTERN5_COUNT)]):
        add(cut_extrude10, mode=Mode.SUBTRACT)

    # Sketch14 → Cut-Extrude11 (cut, through all)
    with BuildSketch(Plane(origin=(12.5, 0, 0), x_dir=(0, 0, -1), z_dir=(1, 0, 0))):
        Polygon((-111.6, -6), (-111.6, 4.5), (-125.6, 4.5), align=None)
    extrude(amount=-CUT_EXTRUDE11_DEPTH, mode=Mode.SUBTRACT)

    # Sketch16 → Cut-Extrude12 (cut, through all)
    with BuildSketch(Plane(origin=(0, 8.5, 0), x_dir=(1, 0, 0), z_dir=(0, 1, 0))):
        with Locations((0, -121.6)):
            Circle(SKETCH16_R)
    extrude(amount=-CUT_EXTRUDE12_DEPTH, mode=Mode.SUBTRACT)

    # Sketch18 → Cut-Extrude14 (cut)
    with BuildSketch(Plane(origin=(0, 8.5, 0), x_dir=(1, 0, 0), z_dir=(0, 1, 0))):
        with BuildLine():
            ThreePointArc((-3.5, -128.6), (0, -126.990227771), (3.5, -128.6))
            Line((3.5, -128.6), (-3.5, -128.6))
        make_face()
        with Locations((0, -130.1)):
            Rectangle(SKETCH18_W, SKETCH18_H)
    extrude(amount=-CUT_EXTRUDE14_DEPTH, mode=Mode.SUBTRACT)

    # Fillet1
    fillet1_edges = [part.edges().sort_by_distance(p)[0] for p in [
        (-3.5, 7.5, 131.6),
        (3.5, 7.5, 131.6),
        (3.5, 7.5, 128.6),
        (-3.5, 7.5, 128.6),
    ]]
    fillet(fillet1_edges, radius=FILLET1_R)


solid = part.part
